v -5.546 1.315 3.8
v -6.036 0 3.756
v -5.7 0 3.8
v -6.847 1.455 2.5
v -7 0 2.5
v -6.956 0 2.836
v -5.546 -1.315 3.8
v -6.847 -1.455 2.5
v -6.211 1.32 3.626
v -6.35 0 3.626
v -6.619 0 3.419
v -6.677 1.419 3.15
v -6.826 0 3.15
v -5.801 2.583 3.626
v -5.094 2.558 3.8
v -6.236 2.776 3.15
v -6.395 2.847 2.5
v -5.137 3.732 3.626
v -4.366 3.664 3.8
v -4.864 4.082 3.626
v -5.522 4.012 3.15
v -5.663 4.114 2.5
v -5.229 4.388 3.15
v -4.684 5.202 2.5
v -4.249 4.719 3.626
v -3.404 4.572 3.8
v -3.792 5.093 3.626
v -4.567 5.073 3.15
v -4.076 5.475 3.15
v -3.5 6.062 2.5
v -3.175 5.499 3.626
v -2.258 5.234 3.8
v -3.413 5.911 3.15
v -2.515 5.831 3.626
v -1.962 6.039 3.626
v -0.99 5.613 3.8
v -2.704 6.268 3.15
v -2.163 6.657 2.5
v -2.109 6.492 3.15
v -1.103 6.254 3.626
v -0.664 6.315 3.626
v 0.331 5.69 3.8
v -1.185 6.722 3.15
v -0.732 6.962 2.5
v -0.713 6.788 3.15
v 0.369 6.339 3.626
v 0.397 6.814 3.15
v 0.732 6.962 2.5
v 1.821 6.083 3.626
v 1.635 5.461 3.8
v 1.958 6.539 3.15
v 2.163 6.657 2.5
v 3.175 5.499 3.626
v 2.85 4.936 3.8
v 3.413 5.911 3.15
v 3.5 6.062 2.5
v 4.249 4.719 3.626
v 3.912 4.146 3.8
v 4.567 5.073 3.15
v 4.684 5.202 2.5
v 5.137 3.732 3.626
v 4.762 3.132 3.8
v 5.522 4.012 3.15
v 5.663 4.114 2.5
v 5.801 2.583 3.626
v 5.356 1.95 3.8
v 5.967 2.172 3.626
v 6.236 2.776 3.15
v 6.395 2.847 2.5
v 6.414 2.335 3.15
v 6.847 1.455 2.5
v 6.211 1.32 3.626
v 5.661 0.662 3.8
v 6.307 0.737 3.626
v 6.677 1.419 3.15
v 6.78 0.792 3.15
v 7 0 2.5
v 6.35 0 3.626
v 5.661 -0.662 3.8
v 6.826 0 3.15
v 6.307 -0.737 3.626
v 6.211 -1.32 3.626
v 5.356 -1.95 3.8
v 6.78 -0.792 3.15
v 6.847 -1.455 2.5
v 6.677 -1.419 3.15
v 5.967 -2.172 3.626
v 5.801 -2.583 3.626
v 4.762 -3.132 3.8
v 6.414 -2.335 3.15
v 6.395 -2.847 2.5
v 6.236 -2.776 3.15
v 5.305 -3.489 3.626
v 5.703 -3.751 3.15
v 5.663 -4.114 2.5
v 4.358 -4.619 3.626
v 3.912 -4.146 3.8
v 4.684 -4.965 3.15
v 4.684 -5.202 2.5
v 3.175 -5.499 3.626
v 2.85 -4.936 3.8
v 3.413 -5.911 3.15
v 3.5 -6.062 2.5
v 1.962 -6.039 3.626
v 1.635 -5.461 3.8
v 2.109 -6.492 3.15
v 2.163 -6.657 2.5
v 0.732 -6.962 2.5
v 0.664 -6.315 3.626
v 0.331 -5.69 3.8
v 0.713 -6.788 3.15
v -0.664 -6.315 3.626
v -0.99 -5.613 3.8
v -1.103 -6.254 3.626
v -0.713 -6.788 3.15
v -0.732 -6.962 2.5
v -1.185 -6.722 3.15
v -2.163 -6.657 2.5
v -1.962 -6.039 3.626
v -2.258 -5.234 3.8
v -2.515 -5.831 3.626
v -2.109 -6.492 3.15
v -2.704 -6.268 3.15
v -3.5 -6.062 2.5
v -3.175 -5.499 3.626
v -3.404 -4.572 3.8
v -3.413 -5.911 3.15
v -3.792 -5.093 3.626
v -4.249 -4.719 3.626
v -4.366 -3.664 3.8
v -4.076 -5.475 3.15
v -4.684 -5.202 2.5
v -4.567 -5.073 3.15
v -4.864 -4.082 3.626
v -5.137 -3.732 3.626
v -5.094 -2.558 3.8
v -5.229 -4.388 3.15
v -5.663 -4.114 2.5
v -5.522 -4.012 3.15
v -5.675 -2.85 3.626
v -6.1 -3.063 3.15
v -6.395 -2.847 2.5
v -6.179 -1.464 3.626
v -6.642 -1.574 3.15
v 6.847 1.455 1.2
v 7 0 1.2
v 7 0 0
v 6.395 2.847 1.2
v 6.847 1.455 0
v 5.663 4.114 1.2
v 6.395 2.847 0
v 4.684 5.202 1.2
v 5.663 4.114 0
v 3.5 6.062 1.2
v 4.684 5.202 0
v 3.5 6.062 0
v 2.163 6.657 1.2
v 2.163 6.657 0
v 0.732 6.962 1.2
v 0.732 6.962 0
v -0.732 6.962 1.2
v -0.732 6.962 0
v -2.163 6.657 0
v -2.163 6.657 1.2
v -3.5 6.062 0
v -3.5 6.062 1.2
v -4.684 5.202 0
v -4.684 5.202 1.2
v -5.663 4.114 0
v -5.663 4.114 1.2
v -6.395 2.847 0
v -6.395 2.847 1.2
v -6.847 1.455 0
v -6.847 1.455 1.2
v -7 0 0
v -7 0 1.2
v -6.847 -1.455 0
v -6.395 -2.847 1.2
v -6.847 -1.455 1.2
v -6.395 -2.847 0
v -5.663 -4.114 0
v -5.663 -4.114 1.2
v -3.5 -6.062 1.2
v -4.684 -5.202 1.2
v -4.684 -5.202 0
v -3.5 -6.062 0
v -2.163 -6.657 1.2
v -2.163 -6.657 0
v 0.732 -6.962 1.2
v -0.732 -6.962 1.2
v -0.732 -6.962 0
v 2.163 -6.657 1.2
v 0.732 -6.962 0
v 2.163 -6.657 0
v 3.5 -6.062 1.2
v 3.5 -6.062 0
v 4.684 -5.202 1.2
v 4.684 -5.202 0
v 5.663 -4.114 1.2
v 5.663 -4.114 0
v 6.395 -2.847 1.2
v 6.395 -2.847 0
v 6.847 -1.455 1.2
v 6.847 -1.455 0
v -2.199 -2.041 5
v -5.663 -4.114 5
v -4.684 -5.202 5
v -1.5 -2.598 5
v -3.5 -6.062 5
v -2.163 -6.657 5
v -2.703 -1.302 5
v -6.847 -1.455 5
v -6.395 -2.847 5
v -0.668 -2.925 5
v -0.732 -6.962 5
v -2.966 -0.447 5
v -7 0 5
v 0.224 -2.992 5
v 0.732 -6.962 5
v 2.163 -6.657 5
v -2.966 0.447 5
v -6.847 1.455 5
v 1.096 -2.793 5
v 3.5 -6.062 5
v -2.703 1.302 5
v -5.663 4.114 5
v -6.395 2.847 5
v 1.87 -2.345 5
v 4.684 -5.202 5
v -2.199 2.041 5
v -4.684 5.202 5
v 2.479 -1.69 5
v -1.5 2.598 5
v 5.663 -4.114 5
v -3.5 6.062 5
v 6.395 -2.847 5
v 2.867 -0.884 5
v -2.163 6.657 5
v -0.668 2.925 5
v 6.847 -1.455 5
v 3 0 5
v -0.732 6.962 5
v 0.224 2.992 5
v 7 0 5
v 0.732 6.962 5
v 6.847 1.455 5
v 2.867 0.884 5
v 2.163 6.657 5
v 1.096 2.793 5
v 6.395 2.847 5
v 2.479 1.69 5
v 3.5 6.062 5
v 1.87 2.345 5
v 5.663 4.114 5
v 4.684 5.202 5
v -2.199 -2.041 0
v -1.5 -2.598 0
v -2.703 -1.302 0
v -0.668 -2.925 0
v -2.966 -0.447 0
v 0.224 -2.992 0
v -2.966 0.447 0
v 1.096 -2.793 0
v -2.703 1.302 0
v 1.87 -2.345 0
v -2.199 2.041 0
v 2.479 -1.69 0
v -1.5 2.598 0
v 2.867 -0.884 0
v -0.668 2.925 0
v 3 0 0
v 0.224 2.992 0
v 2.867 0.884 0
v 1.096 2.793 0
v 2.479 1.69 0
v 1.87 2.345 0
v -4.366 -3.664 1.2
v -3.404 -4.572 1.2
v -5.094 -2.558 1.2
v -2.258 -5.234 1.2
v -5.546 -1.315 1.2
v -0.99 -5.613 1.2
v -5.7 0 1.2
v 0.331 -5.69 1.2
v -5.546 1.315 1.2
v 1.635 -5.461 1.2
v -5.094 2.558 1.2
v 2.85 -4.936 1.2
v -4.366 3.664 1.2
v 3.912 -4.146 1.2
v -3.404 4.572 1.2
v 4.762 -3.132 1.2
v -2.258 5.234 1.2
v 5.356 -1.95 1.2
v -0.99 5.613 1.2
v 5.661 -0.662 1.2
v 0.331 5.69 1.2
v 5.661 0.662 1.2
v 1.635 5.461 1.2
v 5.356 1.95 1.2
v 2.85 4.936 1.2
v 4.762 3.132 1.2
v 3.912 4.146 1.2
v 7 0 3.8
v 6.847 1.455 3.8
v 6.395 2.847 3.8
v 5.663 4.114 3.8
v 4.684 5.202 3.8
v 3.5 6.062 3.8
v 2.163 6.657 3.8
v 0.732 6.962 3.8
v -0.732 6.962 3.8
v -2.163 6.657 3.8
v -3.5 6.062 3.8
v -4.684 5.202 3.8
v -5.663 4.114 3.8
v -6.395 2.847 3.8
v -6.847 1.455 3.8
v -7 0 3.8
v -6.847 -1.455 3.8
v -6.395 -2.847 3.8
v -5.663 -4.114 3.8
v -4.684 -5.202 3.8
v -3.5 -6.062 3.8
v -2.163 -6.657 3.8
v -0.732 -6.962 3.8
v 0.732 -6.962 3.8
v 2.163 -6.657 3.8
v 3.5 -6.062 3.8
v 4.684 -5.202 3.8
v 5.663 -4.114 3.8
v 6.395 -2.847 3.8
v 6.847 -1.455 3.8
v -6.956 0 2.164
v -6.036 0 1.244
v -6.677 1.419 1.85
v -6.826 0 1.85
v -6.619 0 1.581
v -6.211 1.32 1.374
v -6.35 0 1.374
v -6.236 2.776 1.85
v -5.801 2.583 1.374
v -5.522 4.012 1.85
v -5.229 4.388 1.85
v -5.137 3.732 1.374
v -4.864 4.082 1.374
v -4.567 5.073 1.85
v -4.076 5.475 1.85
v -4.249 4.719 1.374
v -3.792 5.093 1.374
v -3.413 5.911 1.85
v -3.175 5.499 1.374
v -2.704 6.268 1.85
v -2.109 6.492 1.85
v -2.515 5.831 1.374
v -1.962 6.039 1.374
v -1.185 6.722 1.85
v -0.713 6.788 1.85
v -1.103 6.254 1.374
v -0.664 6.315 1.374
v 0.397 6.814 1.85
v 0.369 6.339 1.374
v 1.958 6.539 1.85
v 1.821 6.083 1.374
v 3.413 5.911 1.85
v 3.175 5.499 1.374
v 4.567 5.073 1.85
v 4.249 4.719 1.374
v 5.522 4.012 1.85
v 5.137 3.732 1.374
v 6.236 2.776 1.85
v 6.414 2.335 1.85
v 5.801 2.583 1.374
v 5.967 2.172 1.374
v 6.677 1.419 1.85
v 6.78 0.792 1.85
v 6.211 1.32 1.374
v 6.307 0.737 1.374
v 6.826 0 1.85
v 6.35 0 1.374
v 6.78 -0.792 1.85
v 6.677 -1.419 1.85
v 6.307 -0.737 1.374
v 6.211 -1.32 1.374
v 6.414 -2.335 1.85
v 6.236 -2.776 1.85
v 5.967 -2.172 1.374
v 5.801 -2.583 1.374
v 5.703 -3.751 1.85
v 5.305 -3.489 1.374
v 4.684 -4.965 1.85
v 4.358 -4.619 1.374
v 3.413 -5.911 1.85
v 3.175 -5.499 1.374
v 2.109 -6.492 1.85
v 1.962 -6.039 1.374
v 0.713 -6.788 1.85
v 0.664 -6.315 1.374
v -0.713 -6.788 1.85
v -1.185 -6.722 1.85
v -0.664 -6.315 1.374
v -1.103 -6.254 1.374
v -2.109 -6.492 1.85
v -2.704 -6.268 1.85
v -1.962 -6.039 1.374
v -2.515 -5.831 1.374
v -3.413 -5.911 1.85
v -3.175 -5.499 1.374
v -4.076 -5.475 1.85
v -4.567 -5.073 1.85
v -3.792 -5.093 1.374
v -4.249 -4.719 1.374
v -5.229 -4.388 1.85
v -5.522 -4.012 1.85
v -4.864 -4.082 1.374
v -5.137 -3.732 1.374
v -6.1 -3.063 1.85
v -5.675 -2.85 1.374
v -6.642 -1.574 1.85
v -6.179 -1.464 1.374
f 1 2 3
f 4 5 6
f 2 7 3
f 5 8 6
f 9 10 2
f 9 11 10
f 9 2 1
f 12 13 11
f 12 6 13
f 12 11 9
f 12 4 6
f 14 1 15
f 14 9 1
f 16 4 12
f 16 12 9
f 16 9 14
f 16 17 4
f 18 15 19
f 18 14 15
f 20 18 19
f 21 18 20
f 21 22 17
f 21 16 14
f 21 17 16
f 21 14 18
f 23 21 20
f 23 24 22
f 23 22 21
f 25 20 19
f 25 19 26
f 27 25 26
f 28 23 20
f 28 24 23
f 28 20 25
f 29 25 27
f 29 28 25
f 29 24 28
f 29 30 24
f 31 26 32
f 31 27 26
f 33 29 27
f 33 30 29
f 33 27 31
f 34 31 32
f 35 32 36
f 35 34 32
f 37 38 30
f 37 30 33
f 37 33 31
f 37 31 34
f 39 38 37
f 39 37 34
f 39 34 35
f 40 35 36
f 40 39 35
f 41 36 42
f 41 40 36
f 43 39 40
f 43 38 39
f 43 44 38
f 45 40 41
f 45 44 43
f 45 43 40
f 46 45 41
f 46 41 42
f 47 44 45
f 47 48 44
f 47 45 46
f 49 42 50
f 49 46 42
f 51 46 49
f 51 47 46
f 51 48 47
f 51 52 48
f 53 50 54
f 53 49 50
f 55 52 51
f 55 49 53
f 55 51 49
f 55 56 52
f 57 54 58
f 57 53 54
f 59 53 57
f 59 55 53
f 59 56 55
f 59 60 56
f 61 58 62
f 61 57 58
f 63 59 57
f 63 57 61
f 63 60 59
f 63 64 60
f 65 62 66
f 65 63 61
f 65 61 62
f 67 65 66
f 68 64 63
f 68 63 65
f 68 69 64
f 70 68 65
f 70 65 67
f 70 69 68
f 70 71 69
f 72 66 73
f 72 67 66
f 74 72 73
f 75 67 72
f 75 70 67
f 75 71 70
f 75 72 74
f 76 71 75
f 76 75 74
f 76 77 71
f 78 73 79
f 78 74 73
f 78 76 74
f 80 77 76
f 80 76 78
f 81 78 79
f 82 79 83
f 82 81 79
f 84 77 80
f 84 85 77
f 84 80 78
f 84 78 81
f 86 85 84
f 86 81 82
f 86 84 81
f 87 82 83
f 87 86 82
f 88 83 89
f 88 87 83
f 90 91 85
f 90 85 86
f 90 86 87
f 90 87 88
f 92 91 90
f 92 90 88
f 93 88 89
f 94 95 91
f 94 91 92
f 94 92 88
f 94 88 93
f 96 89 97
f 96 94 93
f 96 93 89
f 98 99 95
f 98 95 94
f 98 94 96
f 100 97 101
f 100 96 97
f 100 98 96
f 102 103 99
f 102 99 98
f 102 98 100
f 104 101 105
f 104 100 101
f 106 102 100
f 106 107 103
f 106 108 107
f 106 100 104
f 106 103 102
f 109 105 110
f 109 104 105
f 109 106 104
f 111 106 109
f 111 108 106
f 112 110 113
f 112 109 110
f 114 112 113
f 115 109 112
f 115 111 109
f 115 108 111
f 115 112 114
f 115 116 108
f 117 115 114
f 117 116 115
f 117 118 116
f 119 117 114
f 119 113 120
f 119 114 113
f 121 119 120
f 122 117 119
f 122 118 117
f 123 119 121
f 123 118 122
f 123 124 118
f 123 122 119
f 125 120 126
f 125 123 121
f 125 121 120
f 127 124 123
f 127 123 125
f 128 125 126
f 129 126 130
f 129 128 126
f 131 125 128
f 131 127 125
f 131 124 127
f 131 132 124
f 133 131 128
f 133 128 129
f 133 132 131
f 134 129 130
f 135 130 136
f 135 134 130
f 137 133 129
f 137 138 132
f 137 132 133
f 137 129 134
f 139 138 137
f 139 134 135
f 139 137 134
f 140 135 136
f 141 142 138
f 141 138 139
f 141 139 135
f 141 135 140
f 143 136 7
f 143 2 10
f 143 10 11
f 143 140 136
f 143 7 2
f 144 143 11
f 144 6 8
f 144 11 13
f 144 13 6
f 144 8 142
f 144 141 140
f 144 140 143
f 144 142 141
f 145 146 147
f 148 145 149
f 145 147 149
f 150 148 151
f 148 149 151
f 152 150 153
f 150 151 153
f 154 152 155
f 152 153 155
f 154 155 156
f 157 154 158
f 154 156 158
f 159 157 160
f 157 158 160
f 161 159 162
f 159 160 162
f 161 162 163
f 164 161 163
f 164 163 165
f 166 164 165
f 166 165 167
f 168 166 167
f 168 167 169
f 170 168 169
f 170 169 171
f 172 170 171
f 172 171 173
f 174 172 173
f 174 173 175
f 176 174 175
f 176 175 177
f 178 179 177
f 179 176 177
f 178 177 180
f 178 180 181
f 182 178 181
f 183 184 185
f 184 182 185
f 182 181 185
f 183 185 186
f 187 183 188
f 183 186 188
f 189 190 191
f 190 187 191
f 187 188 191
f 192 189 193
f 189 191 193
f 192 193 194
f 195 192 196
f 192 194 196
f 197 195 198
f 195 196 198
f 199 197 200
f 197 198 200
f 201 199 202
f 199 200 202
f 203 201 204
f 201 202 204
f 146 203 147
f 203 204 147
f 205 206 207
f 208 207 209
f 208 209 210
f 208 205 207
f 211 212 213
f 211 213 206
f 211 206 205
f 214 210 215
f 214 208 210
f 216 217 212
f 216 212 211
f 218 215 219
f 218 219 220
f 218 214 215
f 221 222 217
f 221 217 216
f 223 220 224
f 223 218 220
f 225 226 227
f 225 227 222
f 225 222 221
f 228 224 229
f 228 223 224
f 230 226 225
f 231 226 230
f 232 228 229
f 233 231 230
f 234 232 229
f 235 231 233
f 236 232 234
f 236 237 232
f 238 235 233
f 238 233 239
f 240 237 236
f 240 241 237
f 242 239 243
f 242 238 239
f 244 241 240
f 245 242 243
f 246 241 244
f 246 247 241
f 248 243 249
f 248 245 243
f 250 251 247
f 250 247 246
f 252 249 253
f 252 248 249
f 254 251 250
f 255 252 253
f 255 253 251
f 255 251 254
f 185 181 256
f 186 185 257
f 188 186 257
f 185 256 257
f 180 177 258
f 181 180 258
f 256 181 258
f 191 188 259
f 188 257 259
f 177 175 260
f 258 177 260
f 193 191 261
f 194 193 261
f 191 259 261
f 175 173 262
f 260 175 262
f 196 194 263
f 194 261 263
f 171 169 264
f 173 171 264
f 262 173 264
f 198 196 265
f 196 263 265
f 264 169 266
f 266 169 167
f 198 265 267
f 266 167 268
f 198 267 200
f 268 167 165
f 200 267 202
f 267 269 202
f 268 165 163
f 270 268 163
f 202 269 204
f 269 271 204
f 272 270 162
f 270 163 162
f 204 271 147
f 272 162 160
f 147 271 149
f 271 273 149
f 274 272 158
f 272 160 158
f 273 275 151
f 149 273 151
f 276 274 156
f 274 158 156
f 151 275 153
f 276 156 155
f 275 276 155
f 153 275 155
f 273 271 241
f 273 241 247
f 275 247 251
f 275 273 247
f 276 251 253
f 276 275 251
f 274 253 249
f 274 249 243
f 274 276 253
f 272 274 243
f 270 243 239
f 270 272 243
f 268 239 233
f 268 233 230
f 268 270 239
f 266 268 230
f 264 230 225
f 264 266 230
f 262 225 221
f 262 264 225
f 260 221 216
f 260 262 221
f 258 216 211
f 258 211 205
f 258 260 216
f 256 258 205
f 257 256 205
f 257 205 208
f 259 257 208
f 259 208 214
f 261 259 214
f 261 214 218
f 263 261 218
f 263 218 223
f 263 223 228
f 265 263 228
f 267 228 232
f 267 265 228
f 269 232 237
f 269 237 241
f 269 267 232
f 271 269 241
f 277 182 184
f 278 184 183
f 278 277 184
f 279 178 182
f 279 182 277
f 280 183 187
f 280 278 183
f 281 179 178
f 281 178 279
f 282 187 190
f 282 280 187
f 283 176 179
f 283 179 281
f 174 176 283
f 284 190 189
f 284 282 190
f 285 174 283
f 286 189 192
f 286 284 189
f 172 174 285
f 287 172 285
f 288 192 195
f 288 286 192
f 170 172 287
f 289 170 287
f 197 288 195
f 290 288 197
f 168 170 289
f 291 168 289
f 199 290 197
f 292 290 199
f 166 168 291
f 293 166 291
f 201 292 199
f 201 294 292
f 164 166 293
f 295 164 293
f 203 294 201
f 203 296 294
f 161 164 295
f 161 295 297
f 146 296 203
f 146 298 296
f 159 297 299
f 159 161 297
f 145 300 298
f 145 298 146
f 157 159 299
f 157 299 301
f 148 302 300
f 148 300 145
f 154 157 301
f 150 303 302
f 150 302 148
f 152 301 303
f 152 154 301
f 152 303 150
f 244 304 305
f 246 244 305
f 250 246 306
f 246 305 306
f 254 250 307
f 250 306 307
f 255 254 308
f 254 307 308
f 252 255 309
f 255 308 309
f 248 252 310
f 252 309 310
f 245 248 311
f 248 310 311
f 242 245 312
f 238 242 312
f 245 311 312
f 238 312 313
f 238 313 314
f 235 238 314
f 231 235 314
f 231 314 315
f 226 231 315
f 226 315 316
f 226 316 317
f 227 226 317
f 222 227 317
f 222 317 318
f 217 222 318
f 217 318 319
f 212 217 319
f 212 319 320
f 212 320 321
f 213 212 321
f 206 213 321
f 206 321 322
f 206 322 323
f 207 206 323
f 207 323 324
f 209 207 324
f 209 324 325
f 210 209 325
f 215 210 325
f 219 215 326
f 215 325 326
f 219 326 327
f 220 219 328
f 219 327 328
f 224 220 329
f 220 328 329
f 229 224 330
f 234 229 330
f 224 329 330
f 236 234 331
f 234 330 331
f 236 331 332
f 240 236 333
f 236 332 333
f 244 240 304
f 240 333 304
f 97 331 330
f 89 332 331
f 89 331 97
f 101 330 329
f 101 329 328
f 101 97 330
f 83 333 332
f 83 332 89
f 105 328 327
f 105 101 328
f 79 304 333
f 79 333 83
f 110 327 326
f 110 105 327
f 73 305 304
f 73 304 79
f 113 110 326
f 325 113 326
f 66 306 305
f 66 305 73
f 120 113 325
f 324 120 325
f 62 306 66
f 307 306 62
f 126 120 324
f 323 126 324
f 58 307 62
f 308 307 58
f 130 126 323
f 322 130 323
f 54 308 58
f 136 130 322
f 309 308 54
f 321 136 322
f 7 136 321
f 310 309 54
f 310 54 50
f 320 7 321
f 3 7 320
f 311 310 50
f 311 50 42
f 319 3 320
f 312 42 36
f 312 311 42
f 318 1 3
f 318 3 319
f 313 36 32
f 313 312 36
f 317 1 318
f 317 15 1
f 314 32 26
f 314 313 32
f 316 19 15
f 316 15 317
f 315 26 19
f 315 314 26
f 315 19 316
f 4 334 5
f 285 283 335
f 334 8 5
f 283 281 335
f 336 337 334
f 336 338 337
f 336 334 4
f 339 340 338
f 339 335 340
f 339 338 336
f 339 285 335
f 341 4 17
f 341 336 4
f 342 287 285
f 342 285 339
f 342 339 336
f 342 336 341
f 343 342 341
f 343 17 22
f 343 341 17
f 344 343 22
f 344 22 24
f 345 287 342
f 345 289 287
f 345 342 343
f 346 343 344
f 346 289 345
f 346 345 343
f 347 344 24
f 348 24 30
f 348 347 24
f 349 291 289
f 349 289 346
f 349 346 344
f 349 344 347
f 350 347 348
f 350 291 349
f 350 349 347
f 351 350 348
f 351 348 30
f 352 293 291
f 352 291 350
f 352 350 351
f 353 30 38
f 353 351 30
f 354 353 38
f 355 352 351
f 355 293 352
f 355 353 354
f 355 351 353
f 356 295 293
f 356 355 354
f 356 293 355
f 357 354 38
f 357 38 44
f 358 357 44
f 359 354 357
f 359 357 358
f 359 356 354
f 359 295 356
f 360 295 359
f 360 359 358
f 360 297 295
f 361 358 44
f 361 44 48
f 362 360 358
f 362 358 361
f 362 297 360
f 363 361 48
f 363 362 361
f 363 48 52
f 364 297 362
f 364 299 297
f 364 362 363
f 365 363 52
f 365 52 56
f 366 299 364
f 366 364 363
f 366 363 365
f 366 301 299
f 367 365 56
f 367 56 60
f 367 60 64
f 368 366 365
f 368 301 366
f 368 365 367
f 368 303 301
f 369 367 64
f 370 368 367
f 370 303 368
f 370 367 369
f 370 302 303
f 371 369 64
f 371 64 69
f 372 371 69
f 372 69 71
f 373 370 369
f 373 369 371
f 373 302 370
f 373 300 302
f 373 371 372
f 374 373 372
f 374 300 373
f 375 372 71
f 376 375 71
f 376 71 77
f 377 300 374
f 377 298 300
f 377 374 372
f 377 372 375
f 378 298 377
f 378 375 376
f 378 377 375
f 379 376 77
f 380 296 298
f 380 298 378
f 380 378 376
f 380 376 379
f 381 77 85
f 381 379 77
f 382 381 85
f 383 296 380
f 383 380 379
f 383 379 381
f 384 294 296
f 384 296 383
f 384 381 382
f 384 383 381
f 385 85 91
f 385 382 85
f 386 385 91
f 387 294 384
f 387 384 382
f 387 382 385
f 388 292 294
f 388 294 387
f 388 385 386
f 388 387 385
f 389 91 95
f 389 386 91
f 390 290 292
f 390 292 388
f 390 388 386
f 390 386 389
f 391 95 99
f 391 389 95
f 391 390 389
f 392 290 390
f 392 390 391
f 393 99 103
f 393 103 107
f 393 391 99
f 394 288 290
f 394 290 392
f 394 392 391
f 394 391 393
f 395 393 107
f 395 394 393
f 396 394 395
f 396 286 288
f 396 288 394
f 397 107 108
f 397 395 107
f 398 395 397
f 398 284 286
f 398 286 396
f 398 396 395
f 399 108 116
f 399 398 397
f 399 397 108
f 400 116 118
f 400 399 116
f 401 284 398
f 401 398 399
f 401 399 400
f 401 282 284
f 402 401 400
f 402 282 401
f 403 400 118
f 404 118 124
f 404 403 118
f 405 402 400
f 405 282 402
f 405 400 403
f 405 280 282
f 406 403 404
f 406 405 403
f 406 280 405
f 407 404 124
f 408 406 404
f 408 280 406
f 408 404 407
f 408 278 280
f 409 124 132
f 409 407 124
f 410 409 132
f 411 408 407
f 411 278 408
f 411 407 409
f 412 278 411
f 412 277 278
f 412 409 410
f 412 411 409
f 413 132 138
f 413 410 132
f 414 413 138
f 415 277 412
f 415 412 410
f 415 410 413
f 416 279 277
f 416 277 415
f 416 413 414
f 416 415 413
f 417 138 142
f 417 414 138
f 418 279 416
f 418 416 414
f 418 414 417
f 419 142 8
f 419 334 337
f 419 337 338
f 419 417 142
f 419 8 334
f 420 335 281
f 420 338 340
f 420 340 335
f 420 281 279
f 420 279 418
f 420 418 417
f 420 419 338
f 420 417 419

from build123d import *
from build123d.topology import SkipClean

# Parameters (mm, degrees)
SKETCH_1_R      = 7
SKETCH_1_R_2    = 3
EXTRUDE_1_DEPTH = 5


with BuildPart() as part:
    # 草图1 → 凸台-拉伸1 (new body)
    with BuildSketch(Plane.XY):
        Circle(SKETCH_1_R)
        Circle(SKETCH_1_R_2, mode=Mode.SUBTRACT)
    extrude(amount=EXTRUDE_1_DEPTH)

    # 草图2 → 切除-旋转1 (revolve, cut)
    with SkipClean():  # the faces are left unmerged after this step: merging them gives an invalid solid
        with BuildSketch(Plane(origin=(0, 0, 0), x_dir=(1, 0, 0), z_dir=(0, 1, 0)), mode=Mode.PRIVATE) as cut_revolve_1_sk:
            with BuildLine():
                Line((5.7, -1.2), (7.909662878, -1.2))
                Line((7.909662878, -1.2), (7.909662878, -3.8))
                Line((7.909662878, -3.8), (5.7, -3.8))
                ThreePointArc((5.7, -3.8), (7, -2.5), (5.7, -1.2))
            make_face()
        revolve(cut_revolve_1_sk.sketch.rotate(Axis((0, 0, 0), (0, 0, -1)), 180), axis=Axis((0, 0, 0), (0, 0, -1)), mode=Mode.SUBTRACT)


solid = part.part
